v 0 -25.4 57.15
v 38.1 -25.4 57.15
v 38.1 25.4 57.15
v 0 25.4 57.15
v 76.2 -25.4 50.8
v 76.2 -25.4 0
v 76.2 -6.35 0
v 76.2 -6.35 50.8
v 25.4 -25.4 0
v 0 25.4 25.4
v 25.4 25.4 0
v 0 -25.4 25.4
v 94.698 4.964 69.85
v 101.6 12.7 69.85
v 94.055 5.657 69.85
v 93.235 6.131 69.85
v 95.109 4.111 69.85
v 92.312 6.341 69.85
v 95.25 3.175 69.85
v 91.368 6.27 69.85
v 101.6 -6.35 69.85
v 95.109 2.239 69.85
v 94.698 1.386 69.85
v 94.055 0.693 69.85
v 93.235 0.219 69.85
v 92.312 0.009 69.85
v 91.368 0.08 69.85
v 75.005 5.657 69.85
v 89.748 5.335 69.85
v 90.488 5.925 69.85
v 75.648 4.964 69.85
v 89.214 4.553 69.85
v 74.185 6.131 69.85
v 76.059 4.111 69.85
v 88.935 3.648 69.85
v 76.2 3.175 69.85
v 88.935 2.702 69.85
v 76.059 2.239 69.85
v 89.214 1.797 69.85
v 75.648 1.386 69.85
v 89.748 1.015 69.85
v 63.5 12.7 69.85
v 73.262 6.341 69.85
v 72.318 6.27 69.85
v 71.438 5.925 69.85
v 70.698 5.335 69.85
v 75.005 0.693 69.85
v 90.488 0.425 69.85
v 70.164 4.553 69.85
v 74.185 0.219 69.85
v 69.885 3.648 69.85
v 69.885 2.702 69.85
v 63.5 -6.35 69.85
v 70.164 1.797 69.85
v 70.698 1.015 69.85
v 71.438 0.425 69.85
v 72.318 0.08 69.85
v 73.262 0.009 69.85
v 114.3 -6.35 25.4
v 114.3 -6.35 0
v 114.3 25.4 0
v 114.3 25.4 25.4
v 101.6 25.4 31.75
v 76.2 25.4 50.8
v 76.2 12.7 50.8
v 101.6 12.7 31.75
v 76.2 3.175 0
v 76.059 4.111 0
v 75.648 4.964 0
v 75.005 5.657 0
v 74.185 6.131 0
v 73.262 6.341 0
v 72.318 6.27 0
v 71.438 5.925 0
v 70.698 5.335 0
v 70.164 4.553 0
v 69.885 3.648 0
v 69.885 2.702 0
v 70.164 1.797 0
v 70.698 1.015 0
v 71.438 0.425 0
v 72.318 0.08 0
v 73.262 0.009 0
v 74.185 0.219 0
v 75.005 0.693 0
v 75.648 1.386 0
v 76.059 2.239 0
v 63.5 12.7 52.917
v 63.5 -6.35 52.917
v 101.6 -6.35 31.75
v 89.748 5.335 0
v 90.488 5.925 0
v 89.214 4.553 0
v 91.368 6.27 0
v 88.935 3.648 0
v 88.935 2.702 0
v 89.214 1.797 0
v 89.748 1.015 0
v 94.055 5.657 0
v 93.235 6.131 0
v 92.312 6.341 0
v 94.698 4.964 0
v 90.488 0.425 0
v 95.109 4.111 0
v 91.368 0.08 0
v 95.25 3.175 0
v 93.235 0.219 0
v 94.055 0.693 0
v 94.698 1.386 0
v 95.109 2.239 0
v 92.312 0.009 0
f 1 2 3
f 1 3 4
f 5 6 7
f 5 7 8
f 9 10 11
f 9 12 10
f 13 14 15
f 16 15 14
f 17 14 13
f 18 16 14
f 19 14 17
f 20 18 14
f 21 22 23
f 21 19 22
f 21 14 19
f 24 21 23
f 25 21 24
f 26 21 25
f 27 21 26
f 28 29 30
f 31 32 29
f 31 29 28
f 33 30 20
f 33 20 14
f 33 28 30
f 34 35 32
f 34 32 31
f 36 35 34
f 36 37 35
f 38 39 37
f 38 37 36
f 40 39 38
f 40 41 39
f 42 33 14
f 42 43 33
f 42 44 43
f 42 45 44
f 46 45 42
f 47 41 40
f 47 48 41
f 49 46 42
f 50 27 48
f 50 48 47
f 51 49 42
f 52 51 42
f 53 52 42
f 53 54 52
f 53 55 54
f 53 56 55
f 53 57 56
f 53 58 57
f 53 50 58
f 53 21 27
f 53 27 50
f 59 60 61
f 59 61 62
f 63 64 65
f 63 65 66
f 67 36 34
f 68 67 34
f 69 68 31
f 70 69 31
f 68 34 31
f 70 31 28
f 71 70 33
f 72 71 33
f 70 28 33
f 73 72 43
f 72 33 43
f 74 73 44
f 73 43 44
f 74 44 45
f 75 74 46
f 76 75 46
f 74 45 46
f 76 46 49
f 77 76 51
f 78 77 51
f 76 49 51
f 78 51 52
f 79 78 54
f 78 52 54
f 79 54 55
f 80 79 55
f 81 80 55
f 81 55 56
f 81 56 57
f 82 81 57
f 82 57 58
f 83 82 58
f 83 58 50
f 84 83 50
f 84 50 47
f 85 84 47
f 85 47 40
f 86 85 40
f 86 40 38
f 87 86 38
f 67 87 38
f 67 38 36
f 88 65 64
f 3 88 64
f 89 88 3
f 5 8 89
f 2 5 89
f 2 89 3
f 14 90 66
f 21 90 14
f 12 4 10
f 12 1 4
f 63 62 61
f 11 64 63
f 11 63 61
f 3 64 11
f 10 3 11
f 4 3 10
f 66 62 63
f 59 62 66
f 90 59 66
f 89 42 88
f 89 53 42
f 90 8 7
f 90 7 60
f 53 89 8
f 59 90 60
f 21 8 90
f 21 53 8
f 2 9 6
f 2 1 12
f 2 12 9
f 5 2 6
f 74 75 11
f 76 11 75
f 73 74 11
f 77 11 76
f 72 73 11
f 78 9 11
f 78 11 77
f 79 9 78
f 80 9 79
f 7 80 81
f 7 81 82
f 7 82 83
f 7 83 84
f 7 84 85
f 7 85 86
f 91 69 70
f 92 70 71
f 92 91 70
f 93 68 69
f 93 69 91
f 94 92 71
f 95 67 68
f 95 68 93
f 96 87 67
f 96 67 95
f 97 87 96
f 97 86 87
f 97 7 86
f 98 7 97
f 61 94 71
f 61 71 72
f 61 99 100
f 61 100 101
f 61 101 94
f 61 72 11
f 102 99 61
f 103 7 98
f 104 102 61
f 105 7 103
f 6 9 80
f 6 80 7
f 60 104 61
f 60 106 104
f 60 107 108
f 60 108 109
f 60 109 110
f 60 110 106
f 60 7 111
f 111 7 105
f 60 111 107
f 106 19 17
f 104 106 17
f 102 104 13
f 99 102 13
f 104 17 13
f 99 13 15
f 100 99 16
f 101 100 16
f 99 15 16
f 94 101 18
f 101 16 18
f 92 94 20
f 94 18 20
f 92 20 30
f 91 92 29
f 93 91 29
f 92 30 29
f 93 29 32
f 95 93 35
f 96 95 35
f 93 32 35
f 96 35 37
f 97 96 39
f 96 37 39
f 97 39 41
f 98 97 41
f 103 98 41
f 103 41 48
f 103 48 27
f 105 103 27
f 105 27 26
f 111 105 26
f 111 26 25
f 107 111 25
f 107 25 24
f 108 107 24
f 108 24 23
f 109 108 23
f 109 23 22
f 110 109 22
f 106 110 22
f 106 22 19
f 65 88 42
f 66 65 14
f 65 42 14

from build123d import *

# Parameters (mm, degrees)
F1_DEPTH      = 25.4
F3_DEPTH      = 6.35
F3_DEPTH_BACK = 12.7
F4_DEPTH      = 6.35
F4_DEPTH_BACK = 25.4
F7_DEPTH      = 12.7
F8_R          = 3.175
F9_DEPTH      = 69.851


with BuildPart() as f1:
    # F0 (on Front) → F1 (new body, symmetric)
    with BuildSketch(Plane.XZ):
        Polygon((25.4, 0), (76.2, 0), (76.2, 50.8), (38.1, 57.15), (0, 57.15), (0, 25.4), align=None)
    extrude(amount=F1_DEPTH, both=True)


with BuildPart() as f3:
    # F2 (on Front) → F3 (new body, two sides)
    with BuildSketch(Plane.XZ) as f3_sk:
        Polygon((76.2, 50.8), (76.2, 31.75), (101.6, 31.75), (101.6, 69.85), (63.5, 69.85), (63.5, 52.9166666667), align=None)
    extrude(amount=F3_DEPTH)
    extrude(f3_sk.sketch, amount=-F3_DEPTH_BACK)


with BuildPart() as f4:
    # F2 (on Front) → F4 (new body, two sides)
    with BuildSketch(Plane.XZ) as f4_sk:
        Polygon((76.2, 31.75), (76.2, 0), (114.3, 0), (114.3, 25.4), (101.6, 31.75), align=None)
    extrude(amount=F4_DEPTH)
    extrude(f4_sk.sketch, amount=-F4_DEPTH_BACK)


with BuildPart() as f3_1:
    add(f3.part)

    # F5: union F4, F1
    add(f4.part)
    add(f1.part)

    # F6 (on face) → F7 (join, through all)
    with BuildSketch(Plane(origin=(0, 25.4, 0), x_dir=(-1, 0, 0), z_dir=(0, 1, 0))):
        Polygon((-76.2, 31.75), (-76.2, 50.8), (-101.6, 31.75), align=None)
    extrude(amount=-F7_DEPTH)

    # F8 (on face) → F9 (cut, through all)
    with BuildSketch(Plane.XY.offset(69.85)):
        with Locations((92.075, 3.175)):
            Circle(F8_R)
        with Locations((73.025, 3.175)):
            Circle(F8_R)
    extrude(amount=-F9_DEPTH, mode=Mode.SUBTRACT)


solid = f3_1.part
